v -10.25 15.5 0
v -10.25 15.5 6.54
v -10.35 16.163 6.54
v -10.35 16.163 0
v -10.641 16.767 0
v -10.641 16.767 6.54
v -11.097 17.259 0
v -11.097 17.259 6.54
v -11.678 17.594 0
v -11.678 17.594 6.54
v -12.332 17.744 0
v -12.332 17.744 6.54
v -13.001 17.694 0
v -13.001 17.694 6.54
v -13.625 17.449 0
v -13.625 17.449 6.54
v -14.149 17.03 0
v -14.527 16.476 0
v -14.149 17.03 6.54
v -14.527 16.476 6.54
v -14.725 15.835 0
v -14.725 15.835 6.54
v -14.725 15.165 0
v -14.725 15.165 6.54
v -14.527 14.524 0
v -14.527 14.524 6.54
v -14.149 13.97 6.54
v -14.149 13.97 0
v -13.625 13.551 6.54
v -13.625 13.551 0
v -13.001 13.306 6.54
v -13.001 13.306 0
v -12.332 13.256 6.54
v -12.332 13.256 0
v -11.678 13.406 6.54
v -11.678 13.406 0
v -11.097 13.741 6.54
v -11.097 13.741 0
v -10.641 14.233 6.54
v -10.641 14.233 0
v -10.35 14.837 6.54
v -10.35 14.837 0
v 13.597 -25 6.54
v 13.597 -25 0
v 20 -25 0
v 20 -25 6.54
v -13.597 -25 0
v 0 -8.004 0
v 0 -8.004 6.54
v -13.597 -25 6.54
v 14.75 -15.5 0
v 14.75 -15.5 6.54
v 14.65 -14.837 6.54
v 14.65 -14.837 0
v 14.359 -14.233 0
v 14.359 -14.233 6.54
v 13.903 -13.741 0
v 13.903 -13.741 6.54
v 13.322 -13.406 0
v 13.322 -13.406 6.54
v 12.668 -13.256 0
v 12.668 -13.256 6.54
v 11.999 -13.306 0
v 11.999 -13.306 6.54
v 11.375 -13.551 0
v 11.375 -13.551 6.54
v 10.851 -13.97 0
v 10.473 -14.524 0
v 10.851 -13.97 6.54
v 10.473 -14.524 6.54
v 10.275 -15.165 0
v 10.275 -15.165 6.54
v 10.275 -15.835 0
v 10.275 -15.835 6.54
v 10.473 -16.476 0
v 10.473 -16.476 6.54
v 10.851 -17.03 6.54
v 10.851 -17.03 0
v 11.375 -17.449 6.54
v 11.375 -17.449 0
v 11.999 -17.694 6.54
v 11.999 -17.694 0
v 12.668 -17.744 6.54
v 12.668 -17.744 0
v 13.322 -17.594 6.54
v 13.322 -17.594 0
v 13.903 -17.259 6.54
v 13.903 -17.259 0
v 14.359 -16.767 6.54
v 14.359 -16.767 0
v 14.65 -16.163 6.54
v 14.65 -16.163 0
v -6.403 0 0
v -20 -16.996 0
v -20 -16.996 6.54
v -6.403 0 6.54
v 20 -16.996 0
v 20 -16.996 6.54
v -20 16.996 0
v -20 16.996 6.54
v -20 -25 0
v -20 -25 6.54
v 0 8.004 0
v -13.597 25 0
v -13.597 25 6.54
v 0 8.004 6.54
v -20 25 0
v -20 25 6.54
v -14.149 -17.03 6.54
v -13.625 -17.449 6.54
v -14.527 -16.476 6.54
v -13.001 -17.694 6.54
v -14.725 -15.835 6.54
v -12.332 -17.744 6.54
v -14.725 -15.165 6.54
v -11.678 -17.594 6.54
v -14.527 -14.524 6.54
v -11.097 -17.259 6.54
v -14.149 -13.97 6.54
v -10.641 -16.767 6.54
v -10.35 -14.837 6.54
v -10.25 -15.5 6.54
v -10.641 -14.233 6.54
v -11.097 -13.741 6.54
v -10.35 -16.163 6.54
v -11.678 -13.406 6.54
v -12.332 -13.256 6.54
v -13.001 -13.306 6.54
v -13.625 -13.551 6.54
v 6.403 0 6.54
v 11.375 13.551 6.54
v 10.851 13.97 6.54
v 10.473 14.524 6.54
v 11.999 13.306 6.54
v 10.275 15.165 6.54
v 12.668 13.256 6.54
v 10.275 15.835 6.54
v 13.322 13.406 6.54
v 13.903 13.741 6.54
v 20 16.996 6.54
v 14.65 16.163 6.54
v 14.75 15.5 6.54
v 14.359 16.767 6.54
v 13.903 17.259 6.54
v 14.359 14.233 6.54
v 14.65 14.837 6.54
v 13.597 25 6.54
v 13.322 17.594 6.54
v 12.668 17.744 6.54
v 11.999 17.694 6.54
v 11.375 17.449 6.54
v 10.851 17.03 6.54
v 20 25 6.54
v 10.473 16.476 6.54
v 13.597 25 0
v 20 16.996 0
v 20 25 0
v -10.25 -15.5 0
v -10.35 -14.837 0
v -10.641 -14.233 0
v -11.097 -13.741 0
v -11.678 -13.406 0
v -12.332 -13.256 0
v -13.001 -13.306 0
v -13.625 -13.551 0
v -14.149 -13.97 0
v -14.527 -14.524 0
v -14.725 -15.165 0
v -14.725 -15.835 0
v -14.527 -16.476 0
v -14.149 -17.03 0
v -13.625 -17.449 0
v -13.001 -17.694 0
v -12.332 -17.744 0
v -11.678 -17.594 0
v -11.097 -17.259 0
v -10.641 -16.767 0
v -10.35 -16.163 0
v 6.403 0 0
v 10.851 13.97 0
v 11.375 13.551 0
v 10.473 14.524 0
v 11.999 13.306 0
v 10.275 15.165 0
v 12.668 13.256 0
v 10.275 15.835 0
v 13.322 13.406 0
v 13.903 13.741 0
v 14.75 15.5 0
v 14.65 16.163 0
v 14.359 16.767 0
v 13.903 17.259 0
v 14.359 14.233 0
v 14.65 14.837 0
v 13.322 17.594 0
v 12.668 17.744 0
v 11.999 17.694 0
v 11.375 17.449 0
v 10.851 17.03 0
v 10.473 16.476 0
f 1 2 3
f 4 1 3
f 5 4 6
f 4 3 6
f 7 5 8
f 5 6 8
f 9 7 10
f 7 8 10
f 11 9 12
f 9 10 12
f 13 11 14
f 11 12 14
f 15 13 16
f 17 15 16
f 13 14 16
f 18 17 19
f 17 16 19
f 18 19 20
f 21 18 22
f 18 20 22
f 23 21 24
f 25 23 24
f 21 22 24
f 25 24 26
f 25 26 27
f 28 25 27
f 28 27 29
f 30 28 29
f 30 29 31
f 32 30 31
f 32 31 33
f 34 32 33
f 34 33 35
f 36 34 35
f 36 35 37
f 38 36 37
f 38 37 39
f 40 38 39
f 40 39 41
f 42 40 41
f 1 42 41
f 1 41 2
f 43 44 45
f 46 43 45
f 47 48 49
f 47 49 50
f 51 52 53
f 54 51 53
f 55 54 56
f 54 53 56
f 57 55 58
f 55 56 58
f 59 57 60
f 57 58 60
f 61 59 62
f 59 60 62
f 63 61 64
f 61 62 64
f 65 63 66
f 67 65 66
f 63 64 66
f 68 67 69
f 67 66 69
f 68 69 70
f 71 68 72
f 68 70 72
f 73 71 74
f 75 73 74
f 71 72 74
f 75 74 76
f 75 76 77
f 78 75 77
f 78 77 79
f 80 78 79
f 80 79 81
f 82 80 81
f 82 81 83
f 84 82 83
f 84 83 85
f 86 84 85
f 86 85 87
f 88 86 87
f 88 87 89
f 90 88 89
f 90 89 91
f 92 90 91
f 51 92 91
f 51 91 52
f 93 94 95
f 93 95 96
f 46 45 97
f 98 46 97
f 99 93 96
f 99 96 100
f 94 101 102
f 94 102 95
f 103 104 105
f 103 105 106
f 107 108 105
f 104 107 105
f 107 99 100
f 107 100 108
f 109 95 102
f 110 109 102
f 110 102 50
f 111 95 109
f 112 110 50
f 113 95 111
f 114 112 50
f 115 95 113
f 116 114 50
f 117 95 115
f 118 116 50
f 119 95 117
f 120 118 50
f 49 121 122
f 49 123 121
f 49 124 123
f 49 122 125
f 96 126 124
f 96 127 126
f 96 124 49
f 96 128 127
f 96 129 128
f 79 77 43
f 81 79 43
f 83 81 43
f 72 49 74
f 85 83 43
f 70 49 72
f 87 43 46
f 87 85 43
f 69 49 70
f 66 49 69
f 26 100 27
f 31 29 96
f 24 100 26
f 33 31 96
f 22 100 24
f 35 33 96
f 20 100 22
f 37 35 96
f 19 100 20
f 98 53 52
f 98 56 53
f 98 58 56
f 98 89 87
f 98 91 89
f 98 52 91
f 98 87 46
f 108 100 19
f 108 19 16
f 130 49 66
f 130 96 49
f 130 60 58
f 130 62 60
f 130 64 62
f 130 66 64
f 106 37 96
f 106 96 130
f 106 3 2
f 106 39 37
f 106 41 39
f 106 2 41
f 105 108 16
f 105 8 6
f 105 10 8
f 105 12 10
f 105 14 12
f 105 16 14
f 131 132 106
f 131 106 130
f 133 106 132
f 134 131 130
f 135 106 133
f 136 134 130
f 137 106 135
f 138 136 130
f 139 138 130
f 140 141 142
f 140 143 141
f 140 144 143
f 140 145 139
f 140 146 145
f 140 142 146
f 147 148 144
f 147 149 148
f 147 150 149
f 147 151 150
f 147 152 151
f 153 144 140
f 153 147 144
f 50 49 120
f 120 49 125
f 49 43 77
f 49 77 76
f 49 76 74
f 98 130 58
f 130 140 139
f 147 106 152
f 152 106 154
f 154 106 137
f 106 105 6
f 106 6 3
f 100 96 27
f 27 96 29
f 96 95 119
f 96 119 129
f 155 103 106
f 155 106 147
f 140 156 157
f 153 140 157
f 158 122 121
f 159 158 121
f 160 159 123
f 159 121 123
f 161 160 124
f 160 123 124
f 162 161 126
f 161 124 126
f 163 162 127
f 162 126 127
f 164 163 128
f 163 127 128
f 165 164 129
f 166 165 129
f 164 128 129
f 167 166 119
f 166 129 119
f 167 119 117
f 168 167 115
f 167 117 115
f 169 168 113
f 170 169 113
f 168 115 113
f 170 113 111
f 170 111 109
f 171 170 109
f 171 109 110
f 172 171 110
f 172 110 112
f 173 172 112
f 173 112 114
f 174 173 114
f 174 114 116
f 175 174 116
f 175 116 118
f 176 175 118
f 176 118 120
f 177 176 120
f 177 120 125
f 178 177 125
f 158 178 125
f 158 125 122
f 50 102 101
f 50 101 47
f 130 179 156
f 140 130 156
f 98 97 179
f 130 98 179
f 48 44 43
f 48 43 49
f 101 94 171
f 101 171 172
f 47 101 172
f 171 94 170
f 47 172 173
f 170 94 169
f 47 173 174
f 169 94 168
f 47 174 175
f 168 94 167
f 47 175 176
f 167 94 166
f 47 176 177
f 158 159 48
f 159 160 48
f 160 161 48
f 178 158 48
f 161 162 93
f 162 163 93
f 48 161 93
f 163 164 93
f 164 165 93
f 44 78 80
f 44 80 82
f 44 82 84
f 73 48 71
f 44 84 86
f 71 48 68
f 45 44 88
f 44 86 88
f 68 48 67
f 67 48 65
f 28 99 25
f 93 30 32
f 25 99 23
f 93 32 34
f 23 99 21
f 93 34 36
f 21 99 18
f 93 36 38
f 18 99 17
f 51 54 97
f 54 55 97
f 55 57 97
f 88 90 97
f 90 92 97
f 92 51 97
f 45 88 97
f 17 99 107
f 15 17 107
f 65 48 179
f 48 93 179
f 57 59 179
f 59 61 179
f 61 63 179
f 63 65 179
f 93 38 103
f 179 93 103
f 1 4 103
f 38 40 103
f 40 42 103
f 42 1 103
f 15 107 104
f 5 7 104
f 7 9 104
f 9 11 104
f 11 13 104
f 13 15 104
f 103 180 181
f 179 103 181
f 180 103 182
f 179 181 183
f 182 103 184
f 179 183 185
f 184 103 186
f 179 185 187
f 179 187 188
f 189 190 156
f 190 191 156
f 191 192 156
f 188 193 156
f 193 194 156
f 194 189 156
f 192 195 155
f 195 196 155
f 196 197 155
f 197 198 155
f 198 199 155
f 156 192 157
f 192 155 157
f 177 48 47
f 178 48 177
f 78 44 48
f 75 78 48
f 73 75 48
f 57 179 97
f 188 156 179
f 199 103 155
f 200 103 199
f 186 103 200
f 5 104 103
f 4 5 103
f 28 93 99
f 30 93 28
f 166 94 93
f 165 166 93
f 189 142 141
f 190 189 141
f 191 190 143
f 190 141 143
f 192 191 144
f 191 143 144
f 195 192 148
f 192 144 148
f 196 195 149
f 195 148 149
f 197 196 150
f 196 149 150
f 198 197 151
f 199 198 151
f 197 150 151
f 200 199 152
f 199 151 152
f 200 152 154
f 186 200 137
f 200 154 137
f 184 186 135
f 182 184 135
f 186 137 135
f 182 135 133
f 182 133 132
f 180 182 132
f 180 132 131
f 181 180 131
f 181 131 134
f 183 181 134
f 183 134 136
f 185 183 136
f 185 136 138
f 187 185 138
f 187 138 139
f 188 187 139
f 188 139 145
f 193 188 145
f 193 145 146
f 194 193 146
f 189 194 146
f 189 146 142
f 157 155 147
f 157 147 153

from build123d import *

# Parameters (mm, degrees)
SKETCH1_W            = 40
SKETCH1_H            = 50
BOSS_EXTRUDE1_DEPTH  = 6.54
M4_CLEARANCE_HOLE1_D = 4.5
CUT_EXTRUDE1_DEPTH   = 33.676774627


with BuildPart() as part:
    # Sketch1 → Boss-Extrude1 (new body)
    with BuildSketch(Plane.XY):
        Rectangle(SKETCH1_W, SKETCH1_H)
    extrude(amount=BOSS_EXTRUDE1_DEPTH)

    # M4 Clearance Hole1 (through all)
    with Locations(Plane(origin=(0, 0, 0), x_dir=(-1, 0, 0), z_dir=(0, 0, -1))):
        with Locations((-12.5, 15.5), (12.5, 15.5), (12.5, -15.5), (-12.5, -15.5)):
            Hole(M4_CLEARANCE_HOLE1_D / 2)

    # Sketch6 → Cut-Extrude1 (cut, through all)
    with BuildSketch(Plane(origin=(0, 0, 0), x_dir=(-1, 0, 0), z_dir=(0, 0, -1))):
        Polygon((20, 16.996094703), (20, -16.996094703), (6.403124237, 0), align=None)
        Polygon((13.596875763, -25), (-13.596875763, -25), (0, -8.003905297), align=None)
        Polygon((-20, 16.996094703), (-20, -16.996094703), (-6.403124237, 0), align=None)
        Polygon((-13.596875763, 25), (13.596875763, 25), (0, 8.003905297), align=None)
    extrude(amount=-CUT_EXTRUDE1_DEPTH, mode=Mode.SUBTRACT)


solid = part.part
